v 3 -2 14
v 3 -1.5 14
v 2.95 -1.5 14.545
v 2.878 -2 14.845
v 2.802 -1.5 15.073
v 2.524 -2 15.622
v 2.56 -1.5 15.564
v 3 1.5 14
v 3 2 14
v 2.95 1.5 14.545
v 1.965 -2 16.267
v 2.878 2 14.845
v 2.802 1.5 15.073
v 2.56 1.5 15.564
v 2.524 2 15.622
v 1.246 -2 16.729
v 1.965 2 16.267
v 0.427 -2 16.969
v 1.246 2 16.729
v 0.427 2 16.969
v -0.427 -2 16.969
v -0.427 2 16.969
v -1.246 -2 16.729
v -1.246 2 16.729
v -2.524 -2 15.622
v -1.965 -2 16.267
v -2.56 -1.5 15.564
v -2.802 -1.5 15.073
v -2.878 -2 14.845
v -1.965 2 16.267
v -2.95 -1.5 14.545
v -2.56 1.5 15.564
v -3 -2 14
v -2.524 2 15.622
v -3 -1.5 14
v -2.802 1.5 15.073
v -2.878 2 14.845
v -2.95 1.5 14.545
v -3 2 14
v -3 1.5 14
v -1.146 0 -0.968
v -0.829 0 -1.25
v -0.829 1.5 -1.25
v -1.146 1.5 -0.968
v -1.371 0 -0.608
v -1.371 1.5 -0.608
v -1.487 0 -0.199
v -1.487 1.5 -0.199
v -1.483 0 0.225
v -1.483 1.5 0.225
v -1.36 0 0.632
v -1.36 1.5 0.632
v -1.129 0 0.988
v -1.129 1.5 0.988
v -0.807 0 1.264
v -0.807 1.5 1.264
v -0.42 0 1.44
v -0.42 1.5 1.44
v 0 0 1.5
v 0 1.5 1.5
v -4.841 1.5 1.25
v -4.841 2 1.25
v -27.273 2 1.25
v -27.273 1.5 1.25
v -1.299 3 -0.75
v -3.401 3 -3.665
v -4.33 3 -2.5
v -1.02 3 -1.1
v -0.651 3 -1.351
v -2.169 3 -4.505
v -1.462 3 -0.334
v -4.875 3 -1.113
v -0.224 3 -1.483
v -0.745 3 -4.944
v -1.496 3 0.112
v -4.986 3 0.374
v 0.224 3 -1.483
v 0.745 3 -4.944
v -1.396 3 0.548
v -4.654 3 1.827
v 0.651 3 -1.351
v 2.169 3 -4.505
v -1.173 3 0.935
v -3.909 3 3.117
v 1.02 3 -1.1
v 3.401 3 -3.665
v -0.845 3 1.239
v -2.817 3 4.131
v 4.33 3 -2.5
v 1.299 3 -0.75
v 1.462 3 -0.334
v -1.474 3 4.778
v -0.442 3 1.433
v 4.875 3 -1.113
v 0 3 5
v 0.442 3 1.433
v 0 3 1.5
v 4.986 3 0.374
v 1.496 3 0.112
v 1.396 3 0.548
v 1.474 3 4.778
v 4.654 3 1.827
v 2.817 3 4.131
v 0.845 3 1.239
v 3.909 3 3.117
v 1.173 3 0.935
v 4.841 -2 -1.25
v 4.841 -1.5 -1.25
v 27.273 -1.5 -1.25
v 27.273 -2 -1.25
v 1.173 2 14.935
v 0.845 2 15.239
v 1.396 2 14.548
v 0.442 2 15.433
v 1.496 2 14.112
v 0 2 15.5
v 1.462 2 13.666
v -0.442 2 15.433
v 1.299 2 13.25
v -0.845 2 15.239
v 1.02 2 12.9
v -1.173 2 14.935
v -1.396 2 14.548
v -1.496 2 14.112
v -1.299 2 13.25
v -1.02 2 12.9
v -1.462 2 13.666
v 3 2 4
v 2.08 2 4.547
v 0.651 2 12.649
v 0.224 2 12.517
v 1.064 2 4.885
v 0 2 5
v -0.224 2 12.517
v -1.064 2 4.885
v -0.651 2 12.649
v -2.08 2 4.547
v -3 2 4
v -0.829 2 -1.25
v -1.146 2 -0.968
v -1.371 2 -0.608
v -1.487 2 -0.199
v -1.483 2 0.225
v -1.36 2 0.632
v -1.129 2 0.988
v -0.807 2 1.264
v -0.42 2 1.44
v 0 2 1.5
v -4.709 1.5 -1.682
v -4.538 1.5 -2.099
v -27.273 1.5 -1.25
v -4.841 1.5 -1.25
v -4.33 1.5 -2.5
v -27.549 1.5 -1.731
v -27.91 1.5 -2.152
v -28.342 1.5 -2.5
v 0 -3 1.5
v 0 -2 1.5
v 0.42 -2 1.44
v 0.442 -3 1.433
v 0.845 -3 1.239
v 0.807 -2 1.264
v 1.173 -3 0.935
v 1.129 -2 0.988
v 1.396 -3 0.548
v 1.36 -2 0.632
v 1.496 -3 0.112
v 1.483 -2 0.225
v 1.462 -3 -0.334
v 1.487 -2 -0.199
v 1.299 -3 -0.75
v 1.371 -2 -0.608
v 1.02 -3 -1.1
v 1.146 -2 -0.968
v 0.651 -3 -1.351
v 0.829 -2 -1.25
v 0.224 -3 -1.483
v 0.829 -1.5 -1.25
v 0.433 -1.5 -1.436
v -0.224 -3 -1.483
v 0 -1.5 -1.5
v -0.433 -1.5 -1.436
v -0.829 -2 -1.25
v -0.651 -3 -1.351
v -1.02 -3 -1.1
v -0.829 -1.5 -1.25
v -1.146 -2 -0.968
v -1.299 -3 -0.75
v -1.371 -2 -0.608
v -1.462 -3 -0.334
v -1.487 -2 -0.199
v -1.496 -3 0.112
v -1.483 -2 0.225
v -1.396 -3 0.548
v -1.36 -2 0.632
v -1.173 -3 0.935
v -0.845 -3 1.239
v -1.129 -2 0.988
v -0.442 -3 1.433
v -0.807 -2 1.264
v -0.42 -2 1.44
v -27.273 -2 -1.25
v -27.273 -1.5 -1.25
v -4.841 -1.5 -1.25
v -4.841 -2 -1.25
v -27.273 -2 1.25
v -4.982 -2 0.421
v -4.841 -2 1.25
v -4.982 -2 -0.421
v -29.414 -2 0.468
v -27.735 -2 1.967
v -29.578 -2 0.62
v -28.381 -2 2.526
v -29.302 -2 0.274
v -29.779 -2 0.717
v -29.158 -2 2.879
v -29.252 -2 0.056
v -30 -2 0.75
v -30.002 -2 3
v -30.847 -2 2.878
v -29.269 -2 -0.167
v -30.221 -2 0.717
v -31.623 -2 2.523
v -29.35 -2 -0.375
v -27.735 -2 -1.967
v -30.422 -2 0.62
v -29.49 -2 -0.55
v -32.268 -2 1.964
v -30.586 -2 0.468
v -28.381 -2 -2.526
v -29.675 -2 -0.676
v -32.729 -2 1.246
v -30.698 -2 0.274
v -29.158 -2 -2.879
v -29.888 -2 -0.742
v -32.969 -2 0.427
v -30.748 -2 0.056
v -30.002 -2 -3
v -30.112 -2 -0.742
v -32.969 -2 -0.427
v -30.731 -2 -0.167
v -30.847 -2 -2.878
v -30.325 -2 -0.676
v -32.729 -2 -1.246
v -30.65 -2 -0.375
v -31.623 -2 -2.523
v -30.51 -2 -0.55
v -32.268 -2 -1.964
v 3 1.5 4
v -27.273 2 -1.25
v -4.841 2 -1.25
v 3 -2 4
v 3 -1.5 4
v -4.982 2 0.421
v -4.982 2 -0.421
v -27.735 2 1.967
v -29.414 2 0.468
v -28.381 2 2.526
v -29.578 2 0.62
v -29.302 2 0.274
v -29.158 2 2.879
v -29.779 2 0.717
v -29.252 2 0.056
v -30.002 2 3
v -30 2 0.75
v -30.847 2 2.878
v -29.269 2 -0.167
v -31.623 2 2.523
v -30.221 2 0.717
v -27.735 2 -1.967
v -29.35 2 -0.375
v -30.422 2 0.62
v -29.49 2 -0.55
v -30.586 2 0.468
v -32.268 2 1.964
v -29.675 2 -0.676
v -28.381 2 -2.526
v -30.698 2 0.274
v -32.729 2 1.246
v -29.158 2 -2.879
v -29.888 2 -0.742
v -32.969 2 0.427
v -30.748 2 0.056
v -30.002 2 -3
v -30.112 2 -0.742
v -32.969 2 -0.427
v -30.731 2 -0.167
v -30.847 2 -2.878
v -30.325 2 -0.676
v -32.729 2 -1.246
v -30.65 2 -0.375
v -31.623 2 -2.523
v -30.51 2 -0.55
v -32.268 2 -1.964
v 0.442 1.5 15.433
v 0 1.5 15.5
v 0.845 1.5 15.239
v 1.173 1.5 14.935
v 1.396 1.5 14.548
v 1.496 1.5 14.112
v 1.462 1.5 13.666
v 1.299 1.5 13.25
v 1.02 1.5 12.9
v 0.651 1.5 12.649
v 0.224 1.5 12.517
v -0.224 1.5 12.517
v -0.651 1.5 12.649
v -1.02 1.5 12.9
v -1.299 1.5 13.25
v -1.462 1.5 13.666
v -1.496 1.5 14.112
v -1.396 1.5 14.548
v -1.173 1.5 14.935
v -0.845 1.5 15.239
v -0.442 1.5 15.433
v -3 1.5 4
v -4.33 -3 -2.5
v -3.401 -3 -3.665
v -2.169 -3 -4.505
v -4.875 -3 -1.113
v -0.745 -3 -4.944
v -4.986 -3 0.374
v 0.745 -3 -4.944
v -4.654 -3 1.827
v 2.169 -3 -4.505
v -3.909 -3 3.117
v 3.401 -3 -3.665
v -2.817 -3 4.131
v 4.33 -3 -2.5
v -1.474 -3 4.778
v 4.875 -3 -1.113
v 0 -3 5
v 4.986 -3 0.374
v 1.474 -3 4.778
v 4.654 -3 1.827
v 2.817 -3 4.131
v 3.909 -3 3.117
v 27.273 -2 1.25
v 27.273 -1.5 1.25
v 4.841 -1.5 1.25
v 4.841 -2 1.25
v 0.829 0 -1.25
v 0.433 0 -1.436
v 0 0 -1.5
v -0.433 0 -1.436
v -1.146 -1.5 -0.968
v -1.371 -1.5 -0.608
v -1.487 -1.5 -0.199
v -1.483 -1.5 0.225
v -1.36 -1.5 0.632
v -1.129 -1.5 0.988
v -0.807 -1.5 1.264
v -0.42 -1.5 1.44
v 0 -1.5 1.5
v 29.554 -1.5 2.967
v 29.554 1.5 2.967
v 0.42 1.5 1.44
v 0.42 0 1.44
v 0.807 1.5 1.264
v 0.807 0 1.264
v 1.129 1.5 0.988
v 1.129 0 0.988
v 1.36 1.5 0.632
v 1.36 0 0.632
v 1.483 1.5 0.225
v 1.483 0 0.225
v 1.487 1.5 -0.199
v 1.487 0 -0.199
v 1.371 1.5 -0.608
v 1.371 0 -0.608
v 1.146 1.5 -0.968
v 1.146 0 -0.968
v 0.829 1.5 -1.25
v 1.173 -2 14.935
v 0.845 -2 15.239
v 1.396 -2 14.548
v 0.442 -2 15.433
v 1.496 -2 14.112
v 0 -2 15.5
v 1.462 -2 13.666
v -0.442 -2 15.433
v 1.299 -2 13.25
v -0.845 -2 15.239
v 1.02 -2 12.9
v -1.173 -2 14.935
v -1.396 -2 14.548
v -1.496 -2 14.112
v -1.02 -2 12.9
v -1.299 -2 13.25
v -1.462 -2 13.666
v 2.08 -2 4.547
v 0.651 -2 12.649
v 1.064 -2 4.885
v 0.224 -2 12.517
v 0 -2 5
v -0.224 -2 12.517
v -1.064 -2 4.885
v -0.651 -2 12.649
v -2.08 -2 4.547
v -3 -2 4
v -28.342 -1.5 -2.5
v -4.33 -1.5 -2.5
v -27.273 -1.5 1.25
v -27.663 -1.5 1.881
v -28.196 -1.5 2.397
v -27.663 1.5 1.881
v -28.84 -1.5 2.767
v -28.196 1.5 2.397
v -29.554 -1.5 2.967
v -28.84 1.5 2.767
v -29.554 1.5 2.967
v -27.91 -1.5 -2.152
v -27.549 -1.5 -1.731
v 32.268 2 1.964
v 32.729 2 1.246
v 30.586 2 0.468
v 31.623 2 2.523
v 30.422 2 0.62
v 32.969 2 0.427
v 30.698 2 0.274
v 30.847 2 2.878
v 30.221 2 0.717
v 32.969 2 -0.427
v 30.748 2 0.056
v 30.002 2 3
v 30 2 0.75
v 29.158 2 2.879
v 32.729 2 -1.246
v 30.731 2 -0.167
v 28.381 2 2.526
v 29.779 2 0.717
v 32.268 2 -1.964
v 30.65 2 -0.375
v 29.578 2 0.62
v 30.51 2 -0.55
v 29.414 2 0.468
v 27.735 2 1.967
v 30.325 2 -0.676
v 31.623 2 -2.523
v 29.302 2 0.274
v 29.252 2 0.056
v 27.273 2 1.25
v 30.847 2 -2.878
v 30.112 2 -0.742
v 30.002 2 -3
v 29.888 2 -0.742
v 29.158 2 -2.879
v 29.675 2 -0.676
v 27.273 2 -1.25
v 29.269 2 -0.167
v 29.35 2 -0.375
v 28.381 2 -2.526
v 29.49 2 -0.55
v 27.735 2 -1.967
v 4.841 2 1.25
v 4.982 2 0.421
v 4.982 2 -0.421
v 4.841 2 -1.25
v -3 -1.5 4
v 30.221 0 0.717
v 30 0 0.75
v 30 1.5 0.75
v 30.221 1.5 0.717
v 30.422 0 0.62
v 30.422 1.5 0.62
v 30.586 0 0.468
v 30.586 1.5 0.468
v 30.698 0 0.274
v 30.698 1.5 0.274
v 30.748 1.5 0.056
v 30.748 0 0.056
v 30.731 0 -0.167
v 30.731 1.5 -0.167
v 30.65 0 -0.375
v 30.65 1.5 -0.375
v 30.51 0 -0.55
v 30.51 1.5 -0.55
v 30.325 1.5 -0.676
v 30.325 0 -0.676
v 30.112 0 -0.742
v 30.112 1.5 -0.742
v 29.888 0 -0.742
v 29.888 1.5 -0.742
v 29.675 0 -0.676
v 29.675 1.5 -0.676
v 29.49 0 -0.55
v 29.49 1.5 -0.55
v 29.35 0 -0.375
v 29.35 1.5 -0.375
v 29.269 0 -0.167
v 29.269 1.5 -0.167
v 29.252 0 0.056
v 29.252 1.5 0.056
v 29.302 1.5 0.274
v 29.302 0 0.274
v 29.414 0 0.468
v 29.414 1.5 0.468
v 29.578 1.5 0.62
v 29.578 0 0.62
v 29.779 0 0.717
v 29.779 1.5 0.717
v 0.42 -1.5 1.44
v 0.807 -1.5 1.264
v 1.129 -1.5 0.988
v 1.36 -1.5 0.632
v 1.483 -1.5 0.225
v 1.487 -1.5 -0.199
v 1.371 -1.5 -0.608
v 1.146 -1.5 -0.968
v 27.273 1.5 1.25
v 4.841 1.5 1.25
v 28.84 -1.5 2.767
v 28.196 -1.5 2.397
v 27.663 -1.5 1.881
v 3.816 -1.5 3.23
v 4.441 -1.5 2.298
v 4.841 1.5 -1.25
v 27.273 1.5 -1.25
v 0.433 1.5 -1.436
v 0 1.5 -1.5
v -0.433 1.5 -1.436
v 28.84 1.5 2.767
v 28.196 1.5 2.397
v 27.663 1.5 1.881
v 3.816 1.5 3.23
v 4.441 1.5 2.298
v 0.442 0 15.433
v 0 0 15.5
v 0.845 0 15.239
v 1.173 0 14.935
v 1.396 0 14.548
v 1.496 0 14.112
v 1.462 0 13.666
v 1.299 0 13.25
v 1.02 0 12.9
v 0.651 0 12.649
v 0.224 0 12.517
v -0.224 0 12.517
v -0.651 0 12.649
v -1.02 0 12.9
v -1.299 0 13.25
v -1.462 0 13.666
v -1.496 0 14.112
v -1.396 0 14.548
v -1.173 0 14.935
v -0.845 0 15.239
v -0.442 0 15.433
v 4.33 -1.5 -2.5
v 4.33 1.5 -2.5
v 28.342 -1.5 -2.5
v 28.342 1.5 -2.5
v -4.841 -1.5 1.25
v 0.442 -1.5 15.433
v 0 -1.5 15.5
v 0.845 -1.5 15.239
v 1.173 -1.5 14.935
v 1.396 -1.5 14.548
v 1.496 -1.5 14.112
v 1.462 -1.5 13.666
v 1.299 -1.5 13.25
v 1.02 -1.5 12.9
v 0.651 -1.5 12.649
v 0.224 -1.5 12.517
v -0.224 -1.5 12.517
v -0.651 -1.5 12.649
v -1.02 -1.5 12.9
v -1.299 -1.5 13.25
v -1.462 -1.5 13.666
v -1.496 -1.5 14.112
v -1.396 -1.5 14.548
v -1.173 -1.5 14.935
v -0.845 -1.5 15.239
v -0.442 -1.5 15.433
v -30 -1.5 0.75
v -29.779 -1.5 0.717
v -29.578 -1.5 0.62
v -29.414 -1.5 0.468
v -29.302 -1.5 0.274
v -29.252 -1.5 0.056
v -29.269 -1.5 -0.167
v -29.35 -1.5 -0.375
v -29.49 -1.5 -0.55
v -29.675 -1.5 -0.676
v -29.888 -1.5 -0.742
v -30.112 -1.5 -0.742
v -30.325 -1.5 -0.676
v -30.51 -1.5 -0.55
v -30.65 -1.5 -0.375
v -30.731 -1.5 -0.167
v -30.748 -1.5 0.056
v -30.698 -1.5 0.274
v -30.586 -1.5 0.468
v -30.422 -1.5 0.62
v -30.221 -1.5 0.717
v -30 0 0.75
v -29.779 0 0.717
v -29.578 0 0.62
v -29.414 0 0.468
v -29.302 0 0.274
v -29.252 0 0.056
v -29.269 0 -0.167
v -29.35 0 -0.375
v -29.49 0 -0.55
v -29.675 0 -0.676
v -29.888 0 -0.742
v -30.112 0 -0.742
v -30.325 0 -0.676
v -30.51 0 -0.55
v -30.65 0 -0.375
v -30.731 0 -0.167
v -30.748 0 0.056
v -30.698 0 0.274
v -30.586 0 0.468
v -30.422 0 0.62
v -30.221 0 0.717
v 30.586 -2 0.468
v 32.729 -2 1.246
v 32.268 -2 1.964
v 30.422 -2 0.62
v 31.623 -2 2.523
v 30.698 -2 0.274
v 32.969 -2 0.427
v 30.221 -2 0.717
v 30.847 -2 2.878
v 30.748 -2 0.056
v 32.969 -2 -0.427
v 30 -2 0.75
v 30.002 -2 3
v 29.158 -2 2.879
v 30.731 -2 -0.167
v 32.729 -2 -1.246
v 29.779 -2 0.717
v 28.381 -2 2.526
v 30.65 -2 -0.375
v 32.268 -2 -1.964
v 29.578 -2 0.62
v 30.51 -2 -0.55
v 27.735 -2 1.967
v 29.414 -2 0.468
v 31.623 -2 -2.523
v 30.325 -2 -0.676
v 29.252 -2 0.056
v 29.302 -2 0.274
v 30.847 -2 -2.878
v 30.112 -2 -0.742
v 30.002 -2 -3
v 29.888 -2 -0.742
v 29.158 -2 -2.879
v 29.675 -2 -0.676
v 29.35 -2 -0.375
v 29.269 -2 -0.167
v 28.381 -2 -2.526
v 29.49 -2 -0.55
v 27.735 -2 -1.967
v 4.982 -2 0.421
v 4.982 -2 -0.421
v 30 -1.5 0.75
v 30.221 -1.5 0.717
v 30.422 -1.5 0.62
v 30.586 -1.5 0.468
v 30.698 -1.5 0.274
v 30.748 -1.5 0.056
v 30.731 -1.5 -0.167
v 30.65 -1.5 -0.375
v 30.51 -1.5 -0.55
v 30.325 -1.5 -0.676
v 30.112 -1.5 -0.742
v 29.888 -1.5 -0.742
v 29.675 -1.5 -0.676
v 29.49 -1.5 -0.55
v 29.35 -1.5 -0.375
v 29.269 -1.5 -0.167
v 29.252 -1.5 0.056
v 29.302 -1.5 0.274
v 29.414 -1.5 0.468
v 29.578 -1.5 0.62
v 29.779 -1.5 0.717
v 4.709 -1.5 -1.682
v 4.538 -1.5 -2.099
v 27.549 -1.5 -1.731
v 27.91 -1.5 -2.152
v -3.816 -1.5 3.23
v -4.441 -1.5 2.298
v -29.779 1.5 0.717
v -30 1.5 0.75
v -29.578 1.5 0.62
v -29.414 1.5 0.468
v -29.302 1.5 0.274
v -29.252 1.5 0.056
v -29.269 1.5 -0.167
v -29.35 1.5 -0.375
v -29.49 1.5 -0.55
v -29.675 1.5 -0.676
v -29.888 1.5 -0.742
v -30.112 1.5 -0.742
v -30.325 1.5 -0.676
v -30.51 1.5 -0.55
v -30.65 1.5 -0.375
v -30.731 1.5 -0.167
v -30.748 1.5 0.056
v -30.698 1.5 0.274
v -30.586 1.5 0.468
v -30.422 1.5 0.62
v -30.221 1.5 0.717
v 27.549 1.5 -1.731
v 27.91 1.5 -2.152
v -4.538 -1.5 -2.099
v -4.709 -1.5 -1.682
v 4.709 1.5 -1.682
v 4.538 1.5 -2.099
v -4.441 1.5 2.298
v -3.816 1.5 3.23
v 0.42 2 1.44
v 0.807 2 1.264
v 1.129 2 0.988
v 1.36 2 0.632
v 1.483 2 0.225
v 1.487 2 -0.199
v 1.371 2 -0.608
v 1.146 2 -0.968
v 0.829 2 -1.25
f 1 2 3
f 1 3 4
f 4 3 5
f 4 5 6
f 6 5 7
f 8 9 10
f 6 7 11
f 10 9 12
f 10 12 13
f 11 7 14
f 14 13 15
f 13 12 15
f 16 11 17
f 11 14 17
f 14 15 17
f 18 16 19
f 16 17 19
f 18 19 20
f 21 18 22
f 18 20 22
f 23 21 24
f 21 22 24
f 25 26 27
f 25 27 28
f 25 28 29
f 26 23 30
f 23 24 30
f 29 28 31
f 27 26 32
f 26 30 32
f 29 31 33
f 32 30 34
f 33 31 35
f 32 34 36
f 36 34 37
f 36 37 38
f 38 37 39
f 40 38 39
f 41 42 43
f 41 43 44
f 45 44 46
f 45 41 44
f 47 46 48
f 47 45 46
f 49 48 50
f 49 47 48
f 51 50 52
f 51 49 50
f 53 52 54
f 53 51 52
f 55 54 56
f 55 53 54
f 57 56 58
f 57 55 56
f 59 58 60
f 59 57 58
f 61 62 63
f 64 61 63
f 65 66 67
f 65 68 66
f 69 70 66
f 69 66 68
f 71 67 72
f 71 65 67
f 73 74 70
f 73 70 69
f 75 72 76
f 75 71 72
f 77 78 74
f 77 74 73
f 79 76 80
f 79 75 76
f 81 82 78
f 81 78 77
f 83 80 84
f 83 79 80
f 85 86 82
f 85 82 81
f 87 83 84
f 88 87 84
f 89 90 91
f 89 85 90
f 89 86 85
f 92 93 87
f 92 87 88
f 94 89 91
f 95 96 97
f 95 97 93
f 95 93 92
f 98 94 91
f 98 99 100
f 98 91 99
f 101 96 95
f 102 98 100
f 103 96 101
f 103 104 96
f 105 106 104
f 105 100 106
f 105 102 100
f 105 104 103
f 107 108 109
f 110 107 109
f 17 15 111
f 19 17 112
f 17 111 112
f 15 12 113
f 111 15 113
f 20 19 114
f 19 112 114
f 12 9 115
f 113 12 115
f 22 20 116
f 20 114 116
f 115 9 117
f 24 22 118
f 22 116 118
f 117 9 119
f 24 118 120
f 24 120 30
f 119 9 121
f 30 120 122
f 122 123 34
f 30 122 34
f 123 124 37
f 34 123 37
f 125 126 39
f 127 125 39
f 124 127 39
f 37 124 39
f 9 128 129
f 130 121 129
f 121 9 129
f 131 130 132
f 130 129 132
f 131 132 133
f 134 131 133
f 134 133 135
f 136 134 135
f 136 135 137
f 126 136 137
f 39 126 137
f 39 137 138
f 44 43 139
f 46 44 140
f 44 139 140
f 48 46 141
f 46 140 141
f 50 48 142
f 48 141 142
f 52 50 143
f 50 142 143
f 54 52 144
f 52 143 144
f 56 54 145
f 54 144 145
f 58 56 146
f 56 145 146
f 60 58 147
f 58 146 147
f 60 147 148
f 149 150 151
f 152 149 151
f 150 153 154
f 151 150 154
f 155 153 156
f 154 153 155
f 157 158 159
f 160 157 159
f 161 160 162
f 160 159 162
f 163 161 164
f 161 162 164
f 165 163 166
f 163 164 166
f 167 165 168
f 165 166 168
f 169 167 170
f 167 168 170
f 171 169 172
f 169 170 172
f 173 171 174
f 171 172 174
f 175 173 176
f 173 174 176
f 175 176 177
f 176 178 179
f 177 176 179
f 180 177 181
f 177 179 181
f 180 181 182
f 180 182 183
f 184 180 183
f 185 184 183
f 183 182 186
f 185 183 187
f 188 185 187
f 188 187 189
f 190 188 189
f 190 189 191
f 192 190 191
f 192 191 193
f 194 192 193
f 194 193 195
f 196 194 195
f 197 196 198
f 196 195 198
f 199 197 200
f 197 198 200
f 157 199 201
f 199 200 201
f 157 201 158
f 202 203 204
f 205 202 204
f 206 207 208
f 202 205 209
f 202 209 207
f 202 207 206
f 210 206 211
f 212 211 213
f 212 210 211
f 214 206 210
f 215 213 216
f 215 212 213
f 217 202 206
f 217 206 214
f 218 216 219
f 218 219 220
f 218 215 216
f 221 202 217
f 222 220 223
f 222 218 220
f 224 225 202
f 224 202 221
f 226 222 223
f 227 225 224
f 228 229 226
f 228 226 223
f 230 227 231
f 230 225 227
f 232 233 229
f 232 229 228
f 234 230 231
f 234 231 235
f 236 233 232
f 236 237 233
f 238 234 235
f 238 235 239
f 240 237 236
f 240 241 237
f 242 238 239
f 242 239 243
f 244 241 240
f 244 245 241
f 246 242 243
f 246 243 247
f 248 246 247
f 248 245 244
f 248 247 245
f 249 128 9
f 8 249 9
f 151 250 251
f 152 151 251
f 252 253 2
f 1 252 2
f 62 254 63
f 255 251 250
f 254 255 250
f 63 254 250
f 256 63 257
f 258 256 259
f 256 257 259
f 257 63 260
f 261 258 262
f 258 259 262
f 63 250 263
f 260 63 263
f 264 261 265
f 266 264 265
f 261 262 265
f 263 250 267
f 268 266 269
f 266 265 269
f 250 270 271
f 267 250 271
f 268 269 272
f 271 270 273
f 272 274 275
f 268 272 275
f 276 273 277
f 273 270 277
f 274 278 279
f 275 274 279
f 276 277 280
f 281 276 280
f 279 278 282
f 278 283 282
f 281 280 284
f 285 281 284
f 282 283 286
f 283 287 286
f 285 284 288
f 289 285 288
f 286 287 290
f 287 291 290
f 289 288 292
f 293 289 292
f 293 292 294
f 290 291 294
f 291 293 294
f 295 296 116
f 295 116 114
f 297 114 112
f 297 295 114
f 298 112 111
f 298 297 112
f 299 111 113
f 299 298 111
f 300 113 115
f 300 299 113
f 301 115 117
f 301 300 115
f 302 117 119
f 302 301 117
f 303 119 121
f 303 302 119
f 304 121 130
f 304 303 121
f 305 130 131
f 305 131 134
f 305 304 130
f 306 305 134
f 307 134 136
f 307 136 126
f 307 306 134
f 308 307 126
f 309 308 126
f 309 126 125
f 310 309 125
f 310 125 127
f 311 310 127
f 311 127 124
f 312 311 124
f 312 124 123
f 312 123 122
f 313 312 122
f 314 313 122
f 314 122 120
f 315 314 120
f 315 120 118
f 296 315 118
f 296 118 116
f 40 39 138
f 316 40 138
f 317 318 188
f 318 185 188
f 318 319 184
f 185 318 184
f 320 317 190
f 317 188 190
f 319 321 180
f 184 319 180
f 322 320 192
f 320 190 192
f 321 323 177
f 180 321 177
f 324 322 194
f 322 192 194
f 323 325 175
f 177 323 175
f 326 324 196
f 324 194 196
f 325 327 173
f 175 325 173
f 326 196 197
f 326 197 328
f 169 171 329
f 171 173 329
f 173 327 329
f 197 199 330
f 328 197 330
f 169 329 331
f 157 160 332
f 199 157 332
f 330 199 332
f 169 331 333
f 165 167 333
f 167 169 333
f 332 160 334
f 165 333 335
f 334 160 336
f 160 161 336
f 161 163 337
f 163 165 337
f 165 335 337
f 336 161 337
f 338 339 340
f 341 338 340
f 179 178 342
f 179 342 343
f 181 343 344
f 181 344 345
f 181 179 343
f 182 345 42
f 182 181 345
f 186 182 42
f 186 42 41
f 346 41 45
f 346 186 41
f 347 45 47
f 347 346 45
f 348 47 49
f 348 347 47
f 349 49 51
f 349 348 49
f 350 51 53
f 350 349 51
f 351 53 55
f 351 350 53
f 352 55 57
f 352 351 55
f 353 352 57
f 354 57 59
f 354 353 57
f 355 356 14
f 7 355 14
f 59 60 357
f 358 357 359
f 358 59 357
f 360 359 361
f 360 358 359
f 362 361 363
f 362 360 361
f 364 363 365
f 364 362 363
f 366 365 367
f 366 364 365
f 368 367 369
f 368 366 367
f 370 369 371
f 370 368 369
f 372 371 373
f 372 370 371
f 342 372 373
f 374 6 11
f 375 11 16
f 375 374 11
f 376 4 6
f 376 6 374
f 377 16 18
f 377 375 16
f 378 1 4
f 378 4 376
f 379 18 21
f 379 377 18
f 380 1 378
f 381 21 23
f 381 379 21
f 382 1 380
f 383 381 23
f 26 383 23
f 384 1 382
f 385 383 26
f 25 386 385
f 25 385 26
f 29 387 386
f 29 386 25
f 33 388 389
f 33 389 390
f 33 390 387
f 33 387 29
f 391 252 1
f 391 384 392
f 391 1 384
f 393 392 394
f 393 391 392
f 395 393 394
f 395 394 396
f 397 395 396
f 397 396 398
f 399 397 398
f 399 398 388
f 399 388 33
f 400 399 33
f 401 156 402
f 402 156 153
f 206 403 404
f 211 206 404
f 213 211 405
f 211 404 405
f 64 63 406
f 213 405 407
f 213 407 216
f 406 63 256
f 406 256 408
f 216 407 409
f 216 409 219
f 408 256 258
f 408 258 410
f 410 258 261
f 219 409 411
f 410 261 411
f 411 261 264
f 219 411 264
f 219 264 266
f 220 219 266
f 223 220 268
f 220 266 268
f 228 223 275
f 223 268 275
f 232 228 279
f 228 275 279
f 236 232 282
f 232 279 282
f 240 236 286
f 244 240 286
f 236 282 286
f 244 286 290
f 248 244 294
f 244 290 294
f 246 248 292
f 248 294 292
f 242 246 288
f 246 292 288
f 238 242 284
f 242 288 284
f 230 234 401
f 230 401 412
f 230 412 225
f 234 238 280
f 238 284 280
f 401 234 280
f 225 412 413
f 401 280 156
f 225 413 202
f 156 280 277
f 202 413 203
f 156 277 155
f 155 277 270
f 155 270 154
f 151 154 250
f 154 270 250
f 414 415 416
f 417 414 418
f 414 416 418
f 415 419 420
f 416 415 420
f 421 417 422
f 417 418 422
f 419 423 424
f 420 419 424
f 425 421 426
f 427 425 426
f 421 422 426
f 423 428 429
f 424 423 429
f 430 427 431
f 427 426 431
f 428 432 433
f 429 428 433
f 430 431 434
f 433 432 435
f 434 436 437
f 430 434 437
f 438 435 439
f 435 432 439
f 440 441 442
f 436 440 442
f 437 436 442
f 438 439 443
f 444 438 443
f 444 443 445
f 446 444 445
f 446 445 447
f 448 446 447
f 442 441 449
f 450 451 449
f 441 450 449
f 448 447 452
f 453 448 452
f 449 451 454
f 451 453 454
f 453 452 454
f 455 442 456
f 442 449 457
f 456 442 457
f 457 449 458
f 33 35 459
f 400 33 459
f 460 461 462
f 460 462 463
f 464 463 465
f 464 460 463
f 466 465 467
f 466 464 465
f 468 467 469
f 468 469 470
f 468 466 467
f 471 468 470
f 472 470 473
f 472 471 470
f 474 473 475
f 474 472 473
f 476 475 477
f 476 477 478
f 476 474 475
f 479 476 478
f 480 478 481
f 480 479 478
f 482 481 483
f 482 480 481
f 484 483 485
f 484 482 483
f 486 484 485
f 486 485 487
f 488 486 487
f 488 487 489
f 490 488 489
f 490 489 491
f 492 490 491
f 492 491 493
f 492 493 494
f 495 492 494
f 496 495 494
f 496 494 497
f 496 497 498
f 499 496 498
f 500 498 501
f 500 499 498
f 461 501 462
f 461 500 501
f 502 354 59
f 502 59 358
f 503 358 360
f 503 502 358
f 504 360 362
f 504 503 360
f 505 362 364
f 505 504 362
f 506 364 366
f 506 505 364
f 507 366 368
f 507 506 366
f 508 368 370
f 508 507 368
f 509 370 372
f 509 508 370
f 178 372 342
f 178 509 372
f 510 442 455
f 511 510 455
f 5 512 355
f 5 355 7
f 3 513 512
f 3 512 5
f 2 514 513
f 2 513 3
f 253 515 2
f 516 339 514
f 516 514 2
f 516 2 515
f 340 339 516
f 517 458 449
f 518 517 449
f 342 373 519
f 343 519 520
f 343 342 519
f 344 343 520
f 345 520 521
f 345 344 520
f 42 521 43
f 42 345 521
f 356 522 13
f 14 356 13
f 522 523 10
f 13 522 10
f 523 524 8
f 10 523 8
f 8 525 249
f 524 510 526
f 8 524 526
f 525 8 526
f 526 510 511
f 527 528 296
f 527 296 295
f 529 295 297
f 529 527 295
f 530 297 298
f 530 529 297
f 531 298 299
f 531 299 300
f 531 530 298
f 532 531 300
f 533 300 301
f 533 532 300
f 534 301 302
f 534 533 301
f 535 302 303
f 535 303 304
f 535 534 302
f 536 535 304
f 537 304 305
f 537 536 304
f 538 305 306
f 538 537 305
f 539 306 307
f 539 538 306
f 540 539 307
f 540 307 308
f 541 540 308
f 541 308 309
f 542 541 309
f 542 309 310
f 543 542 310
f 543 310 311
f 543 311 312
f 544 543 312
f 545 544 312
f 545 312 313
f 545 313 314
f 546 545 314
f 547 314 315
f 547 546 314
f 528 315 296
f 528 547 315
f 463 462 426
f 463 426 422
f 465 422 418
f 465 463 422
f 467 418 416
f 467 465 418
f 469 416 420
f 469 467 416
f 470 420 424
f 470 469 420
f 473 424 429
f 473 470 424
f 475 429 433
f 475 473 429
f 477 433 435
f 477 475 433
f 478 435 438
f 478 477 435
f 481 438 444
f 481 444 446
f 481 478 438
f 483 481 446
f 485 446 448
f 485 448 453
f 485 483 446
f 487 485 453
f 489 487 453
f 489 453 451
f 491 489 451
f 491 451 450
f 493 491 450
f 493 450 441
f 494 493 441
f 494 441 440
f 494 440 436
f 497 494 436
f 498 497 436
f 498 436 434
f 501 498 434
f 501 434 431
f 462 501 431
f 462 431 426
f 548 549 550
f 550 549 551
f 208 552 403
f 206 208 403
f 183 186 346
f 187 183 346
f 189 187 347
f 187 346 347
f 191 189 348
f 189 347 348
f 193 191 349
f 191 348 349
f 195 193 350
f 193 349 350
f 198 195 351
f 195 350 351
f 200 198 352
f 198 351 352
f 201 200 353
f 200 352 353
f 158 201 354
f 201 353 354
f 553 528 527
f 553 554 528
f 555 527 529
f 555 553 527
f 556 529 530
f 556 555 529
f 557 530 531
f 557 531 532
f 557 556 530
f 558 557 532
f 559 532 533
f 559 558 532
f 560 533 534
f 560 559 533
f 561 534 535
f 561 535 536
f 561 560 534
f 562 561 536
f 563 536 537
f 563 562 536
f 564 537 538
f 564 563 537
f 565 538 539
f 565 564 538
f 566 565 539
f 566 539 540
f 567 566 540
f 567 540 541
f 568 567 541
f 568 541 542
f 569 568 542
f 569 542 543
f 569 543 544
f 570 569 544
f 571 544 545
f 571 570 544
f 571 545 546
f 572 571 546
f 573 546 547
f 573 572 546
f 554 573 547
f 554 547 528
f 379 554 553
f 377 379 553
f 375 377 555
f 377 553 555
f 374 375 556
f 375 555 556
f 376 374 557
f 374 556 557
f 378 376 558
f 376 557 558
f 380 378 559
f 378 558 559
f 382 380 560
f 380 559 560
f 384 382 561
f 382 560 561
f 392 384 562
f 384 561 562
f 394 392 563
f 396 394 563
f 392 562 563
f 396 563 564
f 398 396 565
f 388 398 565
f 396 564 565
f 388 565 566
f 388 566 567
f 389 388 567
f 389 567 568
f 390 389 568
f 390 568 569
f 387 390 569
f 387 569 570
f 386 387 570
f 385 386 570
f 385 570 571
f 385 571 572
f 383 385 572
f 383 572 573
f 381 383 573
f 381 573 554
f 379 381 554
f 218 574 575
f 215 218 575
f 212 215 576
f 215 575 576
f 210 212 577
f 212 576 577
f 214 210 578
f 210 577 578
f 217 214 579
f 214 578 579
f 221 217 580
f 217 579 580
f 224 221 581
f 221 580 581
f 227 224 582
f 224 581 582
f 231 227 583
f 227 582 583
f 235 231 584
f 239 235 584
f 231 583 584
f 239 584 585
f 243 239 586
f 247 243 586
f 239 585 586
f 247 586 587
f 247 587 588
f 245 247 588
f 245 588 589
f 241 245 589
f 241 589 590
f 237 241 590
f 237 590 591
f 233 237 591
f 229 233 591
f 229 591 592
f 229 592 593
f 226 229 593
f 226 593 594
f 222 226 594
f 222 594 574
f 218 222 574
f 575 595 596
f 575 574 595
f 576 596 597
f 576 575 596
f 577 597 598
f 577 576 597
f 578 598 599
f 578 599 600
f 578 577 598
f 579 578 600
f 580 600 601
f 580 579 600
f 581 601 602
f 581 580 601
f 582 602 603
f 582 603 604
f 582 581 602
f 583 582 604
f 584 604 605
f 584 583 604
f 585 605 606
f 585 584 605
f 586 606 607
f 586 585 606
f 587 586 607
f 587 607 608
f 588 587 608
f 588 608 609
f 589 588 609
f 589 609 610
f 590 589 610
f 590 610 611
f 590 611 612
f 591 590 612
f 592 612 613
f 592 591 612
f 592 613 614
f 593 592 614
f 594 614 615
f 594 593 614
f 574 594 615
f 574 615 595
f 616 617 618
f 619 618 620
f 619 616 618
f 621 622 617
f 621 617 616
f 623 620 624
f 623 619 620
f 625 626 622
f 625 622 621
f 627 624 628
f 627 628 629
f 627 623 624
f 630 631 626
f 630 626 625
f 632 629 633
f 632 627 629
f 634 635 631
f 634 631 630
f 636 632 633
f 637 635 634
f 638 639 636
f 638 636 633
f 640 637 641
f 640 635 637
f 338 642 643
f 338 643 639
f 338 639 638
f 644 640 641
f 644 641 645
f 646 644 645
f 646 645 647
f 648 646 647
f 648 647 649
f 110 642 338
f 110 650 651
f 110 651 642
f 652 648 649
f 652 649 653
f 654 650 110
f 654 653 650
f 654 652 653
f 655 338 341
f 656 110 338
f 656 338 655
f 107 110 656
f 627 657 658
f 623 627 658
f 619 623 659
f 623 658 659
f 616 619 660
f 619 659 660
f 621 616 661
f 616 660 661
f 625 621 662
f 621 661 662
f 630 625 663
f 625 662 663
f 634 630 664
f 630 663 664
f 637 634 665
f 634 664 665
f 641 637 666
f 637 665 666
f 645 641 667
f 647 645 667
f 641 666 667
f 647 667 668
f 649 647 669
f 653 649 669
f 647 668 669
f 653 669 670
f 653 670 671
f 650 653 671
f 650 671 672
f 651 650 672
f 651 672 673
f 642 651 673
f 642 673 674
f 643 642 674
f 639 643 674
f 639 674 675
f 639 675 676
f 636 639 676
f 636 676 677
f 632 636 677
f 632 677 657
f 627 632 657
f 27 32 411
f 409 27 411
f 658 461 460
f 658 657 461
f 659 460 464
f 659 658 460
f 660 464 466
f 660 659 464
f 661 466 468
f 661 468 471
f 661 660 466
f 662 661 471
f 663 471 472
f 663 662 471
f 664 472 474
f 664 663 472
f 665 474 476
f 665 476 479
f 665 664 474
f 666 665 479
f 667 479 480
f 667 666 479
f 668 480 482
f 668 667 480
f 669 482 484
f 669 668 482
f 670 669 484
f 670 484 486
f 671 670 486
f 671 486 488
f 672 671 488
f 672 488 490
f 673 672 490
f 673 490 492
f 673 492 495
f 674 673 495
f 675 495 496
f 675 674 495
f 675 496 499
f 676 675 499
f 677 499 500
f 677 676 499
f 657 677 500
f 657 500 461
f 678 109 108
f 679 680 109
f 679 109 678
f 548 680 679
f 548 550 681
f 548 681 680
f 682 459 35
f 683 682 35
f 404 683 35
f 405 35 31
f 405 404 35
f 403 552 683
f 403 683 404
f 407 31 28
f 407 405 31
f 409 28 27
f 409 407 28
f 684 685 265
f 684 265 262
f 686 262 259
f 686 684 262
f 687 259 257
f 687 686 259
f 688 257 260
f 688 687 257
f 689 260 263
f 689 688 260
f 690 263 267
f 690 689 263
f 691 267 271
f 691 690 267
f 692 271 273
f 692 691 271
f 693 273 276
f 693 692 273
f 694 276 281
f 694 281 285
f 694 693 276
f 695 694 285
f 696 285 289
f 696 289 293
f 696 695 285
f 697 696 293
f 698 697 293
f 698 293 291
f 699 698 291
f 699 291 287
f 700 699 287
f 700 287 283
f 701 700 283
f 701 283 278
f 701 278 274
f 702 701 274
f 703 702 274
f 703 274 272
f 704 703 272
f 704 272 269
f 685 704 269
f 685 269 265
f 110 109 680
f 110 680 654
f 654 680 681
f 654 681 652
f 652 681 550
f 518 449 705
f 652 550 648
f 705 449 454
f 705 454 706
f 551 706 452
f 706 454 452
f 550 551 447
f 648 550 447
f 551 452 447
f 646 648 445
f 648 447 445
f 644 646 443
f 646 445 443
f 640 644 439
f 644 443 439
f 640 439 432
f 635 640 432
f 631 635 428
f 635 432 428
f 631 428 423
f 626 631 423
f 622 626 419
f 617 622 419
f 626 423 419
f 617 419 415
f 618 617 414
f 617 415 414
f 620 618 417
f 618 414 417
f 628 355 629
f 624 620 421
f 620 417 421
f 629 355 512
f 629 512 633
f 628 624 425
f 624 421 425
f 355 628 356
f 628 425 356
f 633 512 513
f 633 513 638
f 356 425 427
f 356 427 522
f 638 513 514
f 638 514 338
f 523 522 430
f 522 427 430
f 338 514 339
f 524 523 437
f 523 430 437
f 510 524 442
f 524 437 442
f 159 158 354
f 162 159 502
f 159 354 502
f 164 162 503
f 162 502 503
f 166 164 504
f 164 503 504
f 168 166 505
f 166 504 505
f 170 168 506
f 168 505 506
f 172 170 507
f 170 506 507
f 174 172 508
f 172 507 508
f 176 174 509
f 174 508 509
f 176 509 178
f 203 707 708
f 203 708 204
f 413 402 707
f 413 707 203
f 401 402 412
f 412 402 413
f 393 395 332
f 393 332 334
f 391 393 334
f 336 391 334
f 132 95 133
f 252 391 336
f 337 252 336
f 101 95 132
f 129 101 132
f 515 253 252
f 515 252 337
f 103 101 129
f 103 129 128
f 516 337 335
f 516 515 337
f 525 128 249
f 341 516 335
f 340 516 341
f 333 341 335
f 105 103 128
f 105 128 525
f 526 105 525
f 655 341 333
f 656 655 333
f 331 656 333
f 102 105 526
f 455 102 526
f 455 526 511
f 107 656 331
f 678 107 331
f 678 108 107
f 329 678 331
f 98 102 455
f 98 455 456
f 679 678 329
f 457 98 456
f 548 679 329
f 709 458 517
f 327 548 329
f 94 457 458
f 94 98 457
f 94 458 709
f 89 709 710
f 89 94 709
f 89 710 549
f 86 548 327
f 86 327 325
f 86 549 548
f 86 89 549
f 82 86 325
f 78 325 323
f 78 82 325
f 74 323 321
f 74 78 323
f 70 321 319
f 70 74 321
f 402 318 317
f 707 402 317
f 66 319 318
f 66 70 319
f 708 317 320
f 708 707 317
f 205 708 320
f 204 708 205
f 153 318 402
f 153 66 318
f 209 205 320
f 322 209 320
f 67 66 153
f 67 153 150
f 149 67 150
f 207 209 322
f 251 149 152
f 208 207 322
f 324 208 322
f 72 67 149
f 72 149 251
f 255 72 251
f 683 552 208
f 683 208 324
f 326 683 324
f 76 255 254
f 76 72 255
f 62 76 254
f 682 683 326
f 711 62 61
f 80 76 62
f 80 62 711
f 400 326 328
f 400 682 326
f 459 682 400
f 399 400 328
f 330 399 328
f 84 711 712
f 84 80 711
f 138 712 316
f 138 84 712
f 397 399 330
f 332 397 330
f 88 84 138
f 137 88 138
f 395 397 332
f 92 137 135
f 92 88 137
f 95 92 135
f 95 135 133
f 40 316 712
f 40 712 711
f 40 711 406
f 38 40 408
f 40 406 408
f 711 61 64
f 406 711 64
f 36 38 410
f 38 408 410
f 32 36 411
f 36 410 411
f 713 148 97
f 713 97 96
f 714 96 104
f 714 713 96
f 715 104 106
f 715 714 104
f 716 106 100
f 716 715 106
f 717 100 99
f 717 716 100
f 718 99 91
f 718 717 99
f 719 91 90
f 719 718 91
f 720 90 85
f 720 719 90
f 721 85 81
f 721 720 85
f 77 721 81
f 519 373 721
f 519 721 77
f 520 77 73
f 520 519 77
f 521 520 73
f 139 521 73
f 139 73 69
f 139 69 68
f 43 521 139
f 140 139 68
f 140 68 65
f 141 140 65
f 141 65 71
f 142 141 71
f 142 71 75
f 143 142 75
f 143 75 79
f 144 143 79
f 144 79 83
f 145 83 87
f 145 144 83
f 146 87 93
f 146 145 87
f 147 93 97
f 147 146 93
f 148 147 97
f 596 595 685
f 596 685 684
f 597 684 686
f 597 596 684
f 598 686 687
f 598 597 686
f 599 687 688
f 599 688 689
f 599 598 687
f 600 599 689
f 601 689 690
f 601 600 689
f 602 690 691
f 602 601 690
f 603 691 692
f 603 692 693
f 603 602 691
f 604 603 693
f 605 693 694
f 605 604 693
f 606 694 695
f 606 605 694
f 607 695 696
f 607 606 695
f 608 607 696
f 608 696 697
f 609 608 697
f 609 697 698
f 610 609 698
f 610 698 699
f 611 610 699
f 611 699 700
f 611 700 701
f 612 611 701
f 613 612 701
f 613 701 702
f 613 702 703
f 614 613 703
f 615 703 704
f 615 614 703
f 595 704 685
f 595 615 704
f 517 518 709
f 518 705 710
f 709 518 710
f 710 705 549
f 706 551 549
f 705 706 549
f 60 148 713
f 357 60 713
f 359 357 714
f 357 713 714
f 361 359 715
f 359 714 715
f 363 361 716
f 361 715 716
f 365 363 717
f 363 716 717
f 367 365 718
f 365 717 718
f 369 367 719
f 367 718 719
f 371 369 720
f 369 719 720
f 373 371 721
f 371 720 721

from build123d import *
from build123d.topology import SkipClean

# Parameters (mm, degrees)
SKETCH1_R      = 0.75
SKETCH1_R_2    = 1.5
EXTRUDE1_DEPTH = 1.5
SKETCH2_R      = 0.75
SKETCH2_R_2    = 1.5
EXTRUDE2_DEPTH = 2
SKETCH3_R      = 5
SKETCH3_R_2    = 1.5
EXTRUDE3_DEPTH = 3


with BuildPart() as part:
    # Sketch1 → Extrude1 (new body, symmetric)
    with BuildSketch(Plane(origin=(0, 0, 0), x_dir=(1, 0, 0), z_dir=(0, 1, 0))):
        with BuildLine():
            Line((-30, 2.5), (30, 2.5))
            ThreePointArc((30, 2.5), (32.440660221, 0.541458851), (31.057213663, -2.26545785))
            Line((31.057213663, -2.26545785), (1.057213663, -16.26545785))
            ThreePointArc((1.057213663, -16.26545785), (0, -16.5), (-1.057213663, -16.26545785))
            Line((-1.057213663, -16.26545785), (-31.057213663, -2.26545785))
            ThreePointArc((-31.057213663, -2.26545785), (-32.440660221, 0.541458851), (-30, 2.5))
        make_face()
        with Locations(Location((30, 0, 0), (0, 0, 270))):  # turned: the seam where the file's is
            Circle(SKETCH1_R, mode=Mode.SUBTRACT)
        with Locations(Location((-30, 0, 0), (0, 0, 270))):  # turned: the seam where the file's is
            Circle(SKETCH1_R, mode=Mode.SUBTRACT)
        with Locations(Location((0, -14, 0), (0, 0, 270))):  # turned: the seam where the file's is
            Circle(SKETCH1_R_2, mode=Mode.SUBTRACT)
        with Locations(Location((0, 0, 0), (0, 0, 270))):  # turned: the seam where the file's is
            Circle(SKETCH1_R_2, mode=Mode.SUBTRACT)
    extrude(amount=EXTRUDE1_DEPTH, both=True)

    # Sketch2 → Extrude2 (add, symmetric)
    with SkipClean():  # keep this step's faces unmerged: merging them makes the solid invalid here
        with BuildSketch(Plane(origin=(0, 0, 0), x_dir=(1, 0, 0), z_dir=(0, 1, 0))):
            with BuildLine():
                Line((-27.272821971, 1.25), (-0.829156198, 1.25))
                ThreePointArc((-0.829156198, 1.25), (0, -1.5), (0.829156198, 1.25))
                Line((0.829156198, 1.25), (27.272821971, 1.25))
                ThreePointArc((27.272821971, 1.25), (33, 0), (27.272821971, -1.25))
                Line((27.272821971, -1.25), (3, -1.25))
                Line((3, -1.25), (3, -14))
                ThreePointArc((3, -14), (0, -17), (-3, -14))
                Line((-3, -14), (-3, -1.25))
                Line((-3, -1.25), (-27.272821971, -1.25))
                ThreePointArc((-27.272821971, -1.25), (-33, 0), (-27.272821971, 1.25))
            make_face()
            with Locations(Location((30, 0, 0), (0, 0, 270))):  # turned: the seam where the file's is
                Circle(SKETCH2_R, mode=Mode.SUBTRACT)
            with Locations(Location((0, -14, 0), (0, 0, 270))):  # turned: the seam where the file's is
                Circle(SKETCH2_R_2, mode=Mode.SUBTRACT)
            with Locations(Location((-30, 0, 0), (0, 0, 270))):  # turned: the seam where the file's is
                Circle(SKETCH2_R, mode=Mode.SUBTRACT)
        extrude(amount=EXTRUDE2_DEPTH, both=True)

    # Sketch3 → Extrude3 (add, symmetric)
    with SkipClean():  # keep this step's faces unmerged: merging them makes the solid invalid here
        with BuildSketch(Plane(origin=(0, 0, 0), x_dir=(1, 0, 0), z_dir=(0, 1, 0))):
            with Locations(Location((0, 0, 0), (0, 0, 270))):  # turned: the seam where the file's is
                Circle(SKETCH3_R)
            with Locations(Location((0, 0, 0), (0, 0, 270))):  # turned: the seam where the file's is
                Circle(SKETCH3_R_2, mode=Mode.SUBTRACT)
        extrude(amount=EXTRUDE3_DEPTH, both=True)


solid = part.part
